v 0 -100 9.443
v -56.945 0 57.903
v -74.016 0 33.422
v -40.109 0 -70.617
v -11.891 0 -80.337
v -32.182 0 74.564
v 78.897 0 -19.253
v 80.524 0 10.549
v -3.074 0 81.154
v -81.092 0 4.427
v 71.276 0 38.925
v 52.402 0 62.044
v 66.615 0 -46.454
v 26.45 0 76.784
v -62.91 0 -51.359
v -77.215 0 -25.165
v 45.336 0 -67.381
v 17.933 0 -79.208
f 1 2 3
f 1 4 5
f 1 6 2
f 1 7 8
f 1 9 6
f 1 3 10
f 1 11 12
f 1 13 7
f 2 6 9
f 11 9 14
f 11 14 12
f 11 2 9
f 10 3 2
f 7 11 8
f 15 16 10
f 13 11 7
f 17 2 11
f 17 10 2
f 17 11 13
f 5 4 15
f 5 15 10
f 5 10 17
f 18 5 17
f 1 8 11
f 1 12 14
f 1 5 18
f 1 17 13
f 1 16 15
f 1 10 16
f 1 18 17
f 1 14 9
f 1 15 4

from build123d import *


with BuildPart() as f3:
    # F0 (on Front) → F3 section 0
    with BuildSketch(Plane.XZ, mode=Mode.PRIVATE) as f3_s0:
        Polygon((-56.9447709006, 57.9030166363), (-74.0163996816, 33.4221310914), (-81.0917035465, 4.4274015441), (-77.2151235029, -25.1652731148), (-62.9102131664, -51.359238194), (-40.1089299443, -70.6168535637), (-11.8907134819, -80.3372715581), (17.9334097249, -79.2076958644), (45.3355265759, -67.3806819392), (66.61482935, -46.4535335489), (78.8974302949, -19.2525780449), (80.5244960927, 10.5485448063), (71.2762824915, 38.9250282299), (52.4018119844, 62.0444709), (26.4501864003, 76.7844639748), (-3.0736834227, 81.1542897124), (-32.1824352676, 74.5637789329), align=None)
    loft([f3_s0.sketch, Vertex(0, -100, 9.4426637515)])


solid = f3.part
